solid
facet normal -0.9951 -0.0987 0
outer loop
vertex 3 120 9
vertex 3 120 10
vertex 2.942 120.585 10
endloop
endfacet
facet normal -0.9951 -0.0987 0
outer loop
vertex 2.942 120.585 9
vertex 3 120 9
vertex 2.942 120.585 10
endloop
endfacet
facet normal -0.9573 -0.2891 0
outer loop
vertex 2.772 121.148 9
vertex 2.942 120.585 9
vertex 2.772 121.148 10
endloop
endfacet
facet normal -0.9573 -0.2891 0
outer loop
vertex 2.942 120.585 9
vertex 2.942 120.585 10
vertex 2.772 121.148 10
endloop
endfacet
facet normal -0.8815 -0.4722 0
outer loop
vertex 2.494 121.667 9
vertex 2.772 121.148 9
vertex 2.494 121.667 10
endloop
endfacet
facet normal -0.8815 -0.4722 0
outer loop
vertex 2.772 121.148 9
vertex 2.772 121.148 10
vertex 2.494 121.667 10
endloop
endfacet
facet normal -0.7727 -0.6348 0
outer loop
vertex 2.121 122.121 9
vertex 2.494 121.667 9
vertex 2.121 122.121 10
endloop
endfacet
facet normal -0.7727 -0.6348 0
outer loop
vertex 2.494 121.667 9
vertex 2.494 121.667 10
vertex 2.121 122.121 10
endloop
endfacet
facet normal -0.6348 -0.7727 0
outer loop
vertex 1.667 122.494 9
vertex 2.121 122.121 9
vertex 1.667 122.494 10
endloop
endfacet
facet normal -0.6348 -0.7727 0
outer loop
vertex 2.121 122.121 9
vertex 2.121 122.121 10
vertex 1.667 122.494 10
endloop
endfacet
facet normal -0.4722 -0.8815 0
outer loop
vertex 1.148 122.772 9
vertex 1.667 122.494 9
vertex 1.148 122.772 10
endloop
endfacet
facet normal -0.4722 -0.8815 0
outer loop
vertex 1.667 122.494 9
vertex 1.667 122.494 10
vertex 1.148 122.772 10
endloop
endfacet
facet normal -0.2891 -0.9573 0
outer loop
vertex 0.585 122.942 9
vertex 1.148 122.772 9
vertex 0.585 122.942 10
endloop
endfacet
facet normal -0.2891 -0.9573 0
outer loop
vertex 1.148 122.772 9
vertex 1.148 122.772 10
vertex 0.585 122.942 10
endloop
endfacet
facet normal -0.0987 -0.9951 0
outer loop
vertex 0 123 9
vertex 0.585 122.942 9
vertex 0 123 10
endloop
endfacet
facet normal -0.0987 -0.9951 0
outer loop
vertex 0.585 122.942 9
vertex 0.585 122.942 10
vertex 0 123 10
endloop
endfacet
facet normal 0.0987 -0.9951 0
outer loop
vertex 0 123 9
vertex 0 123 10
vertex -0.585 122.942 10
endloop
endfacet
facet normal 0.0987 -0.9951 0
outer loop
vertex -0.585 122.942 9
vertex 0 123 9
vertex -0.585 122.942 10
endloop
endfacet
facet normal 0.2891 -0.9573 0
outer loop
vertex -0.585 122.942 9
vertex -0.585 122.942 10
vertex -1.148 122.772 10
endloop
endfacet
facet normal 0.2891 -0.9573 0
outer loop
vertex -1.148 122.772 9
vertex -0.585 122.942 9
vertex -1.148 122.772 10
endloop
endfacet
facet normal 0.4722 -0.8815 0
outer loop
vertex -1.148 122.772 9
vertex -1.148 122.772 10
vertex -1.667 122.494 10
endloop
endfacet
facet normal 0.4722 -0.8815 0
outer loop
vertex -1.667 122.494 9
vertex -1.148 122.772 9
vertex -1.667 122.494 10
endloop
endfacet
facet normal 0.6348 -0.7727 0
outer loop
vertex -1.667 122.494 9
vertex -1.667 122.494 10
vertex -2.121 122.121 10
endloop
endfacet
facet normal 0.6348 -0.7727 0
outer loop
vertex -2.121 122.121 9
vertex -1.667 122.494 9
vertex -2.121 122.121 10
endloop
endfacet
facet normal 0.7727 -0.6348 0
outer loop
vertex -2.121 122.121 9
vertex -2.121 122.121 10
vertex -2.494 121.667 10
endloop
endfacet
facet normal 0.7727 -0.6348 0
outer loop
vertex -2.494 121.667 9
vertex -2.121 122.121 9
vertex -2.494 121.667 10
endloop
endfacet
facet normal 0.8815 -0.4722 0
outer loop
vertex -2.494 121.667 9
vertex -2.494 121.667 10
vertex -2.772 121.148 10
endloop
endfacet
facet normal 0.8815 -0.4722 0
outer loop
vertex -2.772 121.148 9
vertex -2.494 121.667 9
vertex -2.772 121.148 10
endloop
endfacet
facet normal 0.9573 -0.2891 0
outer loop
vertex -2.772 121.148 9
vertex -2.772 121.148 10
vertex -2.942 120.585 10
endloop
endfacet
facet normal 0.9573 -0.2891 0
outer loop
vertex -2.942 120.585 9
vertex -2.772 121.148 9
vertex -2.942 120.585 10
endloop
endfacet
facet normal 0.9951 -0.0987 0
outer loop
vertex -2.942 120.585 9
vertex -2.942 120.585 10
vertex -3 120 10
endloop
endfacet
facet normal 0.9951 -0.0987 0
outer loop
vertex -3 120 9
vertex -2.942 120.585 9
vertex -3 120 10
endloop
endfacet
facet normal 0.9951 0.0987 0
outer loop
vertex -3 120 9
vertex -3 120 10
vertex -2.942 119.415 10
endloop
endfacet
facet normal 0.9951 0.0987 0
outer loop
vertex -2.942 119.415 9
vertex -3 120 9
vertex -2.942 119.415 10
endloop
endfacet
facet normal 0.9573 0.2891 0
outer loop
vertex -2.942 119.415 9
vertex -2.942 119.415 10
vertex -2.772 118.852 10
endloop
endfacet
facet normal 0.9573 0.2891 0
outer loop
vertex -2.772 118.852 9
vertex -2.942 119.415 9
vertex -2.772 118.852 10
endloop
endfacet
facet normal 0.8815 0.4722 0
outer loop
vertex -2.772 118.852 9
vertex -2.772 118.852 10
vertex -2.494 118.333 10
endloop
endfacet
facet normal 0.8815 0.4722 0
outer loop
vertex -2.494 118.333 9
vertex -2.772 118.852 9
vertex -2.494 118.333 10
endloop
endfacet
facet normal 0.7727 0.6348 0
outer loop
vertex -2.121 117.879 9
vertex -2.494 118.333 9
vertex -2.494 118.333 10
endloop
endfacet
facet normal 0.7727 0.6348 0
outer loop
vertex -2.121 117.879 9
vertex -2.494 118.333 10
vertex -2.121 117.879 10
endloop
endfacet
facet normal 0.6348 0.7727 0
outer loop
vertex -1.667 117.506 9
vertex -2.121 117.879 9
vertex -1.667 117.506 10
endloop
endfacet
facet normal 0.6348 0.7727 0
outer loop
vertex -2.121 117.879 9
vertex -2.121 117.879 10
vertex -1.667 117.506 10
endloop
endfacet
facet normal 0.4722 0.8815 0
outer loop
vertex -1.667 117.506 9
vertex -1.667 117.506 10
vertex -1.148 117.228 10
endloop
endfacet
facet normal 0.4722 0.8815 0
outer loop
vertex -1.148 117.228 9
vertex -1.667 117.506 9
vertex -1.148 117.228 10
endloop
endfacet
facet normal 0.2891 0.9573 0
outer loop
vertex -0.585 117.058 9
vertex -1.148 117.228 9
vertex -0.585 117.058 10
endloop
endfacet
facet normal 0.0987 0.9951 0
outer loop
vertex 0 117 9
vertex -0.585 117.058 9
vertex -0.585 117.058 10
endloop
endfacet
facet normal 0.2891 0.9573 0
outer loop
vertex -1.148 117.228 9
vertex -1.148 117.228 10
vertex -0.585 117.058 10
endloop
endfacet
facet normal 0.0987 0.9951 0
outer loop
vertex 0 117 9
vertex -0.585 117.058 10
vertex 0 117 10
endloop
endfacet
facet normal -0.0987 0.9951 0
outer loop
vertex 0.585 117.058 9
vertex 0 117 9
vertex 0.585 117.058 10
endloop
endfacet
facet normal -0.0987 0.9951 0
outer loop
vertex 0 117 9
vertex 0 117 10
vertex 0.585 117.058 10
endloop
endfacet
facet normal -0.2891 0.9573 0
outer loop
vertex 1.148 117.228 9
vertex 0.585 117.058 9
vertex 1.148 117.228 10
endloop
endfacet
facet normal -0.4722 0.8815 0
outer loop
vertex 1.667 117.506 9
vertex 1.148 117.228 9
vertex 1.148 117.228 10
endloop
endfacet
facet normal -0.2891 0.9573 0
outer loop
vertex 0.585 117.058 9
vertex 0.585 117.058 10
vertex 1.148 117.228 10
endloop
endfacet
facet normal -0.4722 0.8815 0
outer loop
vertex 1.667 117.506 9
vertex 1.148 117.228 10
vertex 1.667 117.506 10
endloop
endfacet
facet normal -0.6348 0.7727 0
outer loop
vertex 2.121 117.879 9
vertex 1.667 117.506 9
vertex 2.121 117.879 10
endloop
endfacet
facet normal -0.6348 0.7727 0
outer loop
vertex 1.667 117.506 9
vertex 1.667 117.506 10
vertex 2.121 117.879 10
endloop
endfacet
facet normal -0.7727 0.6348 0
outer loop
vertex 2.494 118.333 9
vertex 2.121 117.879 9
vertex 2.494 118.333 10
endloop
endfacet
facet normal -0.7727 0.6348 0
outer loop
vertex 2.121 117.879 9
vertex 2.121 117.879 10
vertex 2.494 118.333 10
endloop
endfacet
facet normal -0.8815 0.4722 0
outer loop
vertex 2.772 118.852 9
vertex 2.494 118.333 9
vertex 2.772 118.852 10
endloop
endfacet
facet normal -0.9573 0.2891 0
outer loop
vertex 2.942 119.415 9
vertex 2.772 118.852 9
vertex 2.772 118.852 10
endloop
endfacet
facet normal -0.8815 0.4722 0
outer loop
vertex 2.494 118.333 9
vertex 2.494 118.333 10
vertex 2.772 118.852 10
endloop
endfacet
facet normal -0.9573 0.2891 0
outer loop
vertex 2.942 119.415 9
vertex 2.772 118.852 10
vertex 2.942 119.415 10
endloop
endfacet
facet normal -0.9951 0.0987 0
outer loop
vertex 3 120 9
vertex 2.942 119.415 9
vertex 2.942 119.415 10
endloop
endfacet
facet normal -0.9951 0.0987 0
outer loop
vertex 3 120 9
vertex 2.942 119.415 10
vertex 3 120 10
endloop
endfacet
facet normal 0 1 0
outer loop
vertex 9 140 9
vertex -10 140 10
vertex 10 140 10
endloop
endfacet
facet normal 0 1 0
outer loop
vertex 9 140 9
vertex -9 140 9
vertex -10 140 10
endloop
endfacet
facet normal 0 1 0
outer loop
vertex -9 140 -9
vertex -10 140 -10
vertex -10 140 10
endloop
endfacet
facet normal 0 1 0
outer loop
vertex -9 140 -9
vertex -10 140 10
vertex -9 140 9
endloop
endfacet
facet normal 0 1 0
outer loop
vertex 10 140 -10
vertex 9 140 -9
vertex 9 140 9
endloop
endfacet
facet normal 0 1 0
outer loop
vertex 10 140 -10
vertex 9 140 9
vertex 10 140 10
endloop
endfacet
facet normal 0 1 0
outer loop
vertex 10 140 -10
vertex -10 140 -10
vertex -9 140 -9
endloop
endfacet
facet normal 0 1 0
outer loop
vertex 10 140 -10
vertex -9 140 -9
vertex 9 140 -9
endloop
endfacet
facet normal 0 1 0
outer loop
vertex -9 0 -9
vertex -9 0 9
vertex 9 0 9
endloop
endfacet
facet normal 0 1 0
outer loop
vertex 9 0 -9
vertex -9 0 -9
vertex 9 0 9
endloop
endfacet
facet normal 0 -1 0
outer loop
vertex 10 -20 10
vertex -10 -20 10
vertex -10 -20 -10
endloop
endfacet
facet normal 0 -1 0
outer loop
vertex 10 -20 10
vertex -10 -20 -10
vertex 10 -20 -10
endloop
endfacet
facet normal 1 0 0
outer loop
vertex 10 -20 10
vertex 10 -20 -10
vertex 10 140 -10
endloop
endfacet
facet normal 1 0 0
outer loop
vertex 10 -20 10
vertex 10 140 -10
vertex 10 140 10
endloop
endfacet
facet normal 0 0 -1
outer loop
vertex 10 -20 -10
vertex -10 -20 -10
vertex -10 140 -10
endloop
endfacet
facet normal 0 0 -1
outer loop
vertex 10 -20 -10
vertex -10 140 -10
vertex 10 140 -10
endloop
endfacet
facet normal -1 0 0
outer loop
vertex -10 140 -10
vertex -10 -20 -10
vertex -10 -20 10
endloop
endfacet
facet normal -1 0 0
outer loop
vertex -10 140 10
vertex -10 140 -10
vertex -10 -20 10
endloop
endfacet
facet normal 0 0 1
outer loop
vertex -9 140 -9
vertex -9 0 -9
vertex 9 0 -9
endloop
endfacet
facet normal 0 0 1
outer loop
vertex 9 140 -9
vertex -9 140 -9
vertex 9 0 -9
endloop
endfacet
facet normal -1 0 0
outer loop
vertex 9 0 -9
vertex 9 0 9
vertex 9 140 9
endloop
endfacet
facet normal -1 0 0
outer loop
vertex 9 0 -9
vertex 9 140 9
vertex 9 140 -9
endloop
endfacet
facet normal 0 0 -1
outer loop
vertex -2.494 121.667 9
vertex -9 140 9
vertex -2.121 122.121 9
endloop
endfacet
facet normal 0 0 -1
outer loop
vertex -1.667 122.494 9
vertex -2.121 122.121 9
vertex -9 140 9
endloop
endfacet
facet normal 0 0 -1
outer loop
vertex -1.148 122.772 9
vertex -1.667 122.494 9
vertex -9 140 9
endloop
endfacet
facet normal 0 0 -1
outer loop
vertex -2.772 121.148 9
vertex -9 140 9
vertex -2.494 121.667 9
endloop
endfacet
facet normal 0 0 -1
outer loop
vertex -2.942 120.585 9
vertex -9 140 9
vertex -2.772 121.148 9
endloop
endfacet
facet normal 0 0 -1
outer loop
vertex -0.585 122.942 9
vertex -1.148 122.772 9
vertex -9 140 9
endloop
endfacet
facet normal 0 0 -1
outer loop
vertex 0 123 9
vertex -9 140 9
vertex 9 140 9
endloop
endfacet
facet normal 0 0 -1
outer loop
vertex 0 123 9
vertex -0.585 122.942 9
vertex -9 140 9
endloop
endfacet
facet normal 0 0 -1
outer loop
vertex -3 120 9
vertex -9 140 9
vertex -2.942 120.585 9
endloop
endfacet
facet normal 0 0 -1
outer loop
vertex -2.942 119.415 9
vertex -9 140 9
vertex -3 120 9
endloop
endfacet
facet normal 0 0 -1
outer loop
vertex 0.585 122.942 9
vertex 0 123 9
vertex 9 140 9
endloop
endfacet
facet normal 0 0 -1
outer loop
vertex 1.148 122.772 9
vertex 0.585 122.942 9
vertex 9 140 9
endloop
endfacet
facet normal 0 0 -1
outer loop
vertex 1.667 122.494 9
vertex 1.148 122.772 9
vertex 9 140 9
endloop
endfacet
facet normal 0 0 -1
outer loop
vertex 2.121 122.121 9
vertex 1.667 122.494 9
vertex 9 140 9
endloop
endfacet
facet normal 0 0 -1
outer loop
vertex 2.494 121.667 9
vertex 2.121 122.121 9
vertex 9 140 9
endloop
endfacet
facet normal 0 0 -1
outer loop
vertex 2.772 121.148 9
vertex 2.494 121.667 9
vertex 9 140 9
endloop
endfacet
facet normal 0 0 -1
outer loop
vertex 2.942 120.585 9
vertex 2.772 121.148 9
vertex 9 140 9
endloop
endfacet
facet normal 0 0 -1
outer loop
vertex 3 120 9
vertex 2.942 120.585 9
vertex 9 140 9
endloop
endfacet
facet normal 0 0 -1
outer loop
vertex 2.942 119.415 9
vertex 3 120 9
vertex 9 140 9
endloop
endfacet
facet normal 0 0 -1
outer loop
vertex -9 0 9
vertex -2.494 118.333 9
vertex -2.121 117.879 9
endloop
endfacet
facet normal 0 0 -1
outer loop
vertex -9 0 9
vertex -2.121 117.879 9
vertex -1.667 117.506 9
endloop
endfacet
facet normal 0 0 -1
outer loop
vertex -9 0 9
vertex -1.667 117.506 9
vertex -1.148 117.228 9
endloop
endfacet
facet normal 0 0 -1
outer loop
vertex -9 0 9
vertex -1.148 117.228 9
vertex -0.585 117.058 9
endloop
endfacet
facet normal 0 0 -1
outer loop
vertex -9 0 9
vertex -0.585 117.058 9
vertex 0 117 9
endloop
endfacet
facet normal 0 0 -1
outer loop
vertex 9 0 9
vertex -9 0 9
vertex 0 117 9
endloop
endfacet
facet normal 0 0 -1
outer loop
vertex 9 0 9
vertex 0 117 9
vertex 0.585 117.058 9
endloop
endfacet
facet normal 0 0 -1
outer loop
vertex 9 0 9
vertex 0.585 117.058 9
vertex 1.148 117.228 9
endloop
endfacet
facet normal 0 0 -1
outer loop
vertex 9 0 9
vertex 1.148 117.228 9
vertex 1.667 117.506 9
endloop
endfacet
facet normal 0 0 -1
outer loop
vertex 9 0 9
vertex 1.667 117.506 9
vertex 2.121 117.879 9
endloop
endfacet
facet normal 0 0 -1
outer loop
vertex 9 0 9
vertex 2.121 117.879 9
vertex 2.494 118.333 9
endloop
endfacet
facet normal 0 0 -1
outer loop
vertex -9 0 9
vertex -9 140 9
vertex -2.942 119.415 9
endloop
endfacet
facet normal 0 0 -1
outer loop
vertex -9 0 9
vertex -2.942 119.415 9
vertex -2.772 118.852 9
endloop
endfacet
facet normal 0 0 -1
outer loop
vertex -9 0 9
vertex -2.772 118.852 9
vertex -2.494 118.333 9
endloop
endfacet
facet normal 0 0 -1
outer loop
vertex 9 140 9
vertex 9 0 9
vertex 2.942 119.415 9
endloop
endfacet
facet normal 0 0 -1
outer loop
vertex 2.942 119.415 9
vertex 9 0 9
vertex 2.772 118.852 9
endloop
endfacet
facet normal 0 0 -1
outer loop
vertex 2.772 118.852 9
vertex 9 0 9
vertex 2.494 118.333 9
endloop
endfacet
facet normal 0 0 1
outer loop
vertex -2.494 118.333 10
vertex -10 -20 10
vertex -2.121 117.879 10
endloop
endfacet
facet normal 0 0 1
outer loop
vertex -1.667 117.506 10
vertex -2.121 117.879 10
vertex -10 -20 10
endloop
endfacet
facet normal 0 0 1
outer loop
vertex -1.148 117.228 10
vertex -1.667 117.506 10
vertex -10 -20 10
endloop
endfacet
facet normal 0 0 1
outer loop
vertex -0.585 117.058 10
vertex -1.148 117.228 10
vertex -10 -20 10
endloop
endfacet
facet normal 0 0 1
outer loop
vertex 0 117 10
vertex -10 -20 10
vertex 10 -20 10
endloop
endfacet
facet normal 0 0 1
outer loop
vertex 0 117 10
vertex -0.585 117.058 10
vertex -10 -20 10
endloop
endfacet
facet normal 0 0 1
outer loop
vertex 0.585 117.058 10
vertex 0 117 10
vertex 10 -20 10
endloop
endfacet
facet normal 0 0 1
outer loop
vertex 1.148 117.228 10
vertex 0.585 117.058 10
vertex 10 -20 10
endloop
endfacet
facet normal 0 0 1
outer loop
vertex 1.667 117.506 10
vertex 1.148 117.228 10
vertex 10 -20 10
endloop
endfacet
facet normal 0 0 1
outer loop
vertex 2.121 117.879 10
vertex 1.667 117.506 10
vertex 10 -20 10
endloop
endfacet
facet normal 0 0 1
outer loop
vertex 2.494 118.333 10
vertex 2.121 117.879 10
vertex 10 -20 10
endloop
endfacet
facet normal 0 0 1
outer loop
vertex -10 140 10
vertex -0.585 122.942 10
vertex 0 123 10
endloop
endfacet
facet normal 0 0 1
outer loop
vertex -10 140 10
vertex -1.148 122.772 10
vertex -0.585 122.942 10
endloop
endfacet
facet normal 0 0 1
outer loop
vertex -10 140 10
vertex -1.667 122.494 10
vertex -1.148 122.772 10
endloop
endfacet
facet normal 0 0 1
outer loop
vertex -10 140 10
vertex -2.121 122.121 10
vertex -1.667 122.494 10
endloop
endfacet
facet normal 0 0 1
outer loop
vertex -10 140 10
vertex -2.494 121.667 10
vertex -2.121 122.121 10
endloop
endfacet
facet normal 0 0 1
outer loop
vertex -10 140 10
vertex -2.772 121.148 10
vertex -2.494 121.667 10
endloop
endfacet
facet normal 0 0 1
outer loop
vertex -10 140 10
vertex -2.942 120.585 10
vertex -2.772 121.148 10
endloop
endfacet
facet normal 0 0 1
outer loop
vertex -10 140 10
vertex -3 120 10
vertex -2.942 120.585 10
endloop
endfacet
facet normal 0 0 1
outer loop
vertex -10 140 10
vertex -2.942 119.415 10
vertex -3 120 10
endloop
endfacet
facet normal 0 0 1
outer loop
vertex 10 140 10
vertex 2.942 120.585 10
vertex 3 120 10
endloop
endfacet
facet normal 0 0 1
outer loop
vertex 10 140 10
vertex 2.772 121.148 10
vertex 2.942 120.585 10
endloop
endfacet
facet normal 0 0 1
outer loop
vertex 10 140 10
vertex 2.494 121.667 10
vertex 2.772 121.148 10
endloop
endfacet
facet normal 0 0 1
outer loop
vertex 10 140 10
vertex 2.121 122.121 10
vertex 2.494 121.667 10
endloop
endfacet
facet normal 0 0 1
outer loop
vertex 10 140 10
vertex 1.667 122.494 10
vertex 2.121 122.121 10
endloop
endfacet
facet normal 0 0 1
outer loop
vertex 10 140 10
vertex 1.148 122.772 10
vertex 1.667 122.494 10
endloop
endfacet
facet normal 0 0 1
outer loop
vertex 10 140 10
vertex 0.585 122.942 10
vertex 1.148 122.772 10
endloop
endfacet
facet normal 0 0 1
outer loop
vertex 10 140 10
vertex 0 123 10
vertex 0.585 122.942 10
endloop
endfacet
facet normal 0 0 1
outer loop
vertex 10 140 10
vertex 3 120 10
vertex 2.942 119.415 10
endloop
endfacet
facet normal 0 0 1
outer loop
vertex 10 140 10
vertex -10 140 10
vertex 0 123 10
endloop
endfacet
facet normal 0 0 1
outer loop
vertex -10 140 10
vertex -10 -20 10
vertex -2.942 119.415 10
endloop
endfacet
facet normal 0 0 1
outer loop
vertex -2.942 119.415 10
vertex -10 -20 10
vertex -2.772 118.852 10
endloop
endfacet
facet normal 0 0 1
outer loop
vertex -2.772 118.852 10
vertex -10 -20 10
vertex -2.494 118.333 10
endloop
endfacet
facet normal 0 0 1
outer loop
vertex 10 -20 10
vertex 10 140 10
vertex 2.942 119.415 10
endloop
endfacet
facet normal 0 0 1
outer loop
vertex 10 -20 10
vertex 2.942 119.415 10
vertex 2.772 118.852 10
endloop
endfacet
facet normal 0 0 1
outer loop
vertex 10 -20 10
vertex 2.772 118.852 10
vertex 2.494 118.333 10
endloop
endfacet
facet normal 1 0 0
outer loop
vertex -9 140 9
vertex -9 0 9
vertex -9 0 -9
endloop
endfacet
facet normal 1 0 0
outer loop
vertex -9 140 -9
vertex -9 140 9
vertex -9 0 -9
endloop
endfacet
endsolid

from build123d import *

# Parameters (mm, degrees)
SKETCH_1_W          = 20
SKETCH_1_H          = 20
SKETCH_1_W_2        = 18
SKETCH_1_H_2        = 18
EXTRUDE_1_DEPTH     = 140
SKETCH_2_W          = 20
SKETCH_2_H          = 20
EXTRUDE_2_DEPTH     = 20
SKETCH_3_R          = 3
CUT_EXTRUDE_1_DEPTH = 2


with BuildPart() as part:
    # 草图1 → 凸台-拉伸1 (new body)
    with BuildSketch(Plane(origin=(0, 0, 0), x_dir=(1, 0, 0), z_dir=(0, 1, 0))):
        Rectangle(SKETCH_1_W, SKETCH_1_H)
        Rectangle(SKETCH_1_W_2, SKETCH_1_H_2, mode=Mode.SUBTRACT)
    extrude(amount=EXTRUDE_1_DEPTH)

    # 草图2 → 凸台-拉伸2 (add)
    with BuildSketch(Plane.XZ):
        Rectangle(SKETCH_2_W, SKETCH_2_H)
    extrude(amount=EXTRUDE_2_DEPTH)

    # 草图3 → 切除-拉伸1 (cut)
    with BuildSketch(Plane.XY.offset(10)):
        with Locations((0, 120)):
            Circle(SKETCH_3_R)
    extrude(amount=-CUT_EXTRUDE_1_DEPTH, mode=Mode.SUBTRACT)


solid = part.part
